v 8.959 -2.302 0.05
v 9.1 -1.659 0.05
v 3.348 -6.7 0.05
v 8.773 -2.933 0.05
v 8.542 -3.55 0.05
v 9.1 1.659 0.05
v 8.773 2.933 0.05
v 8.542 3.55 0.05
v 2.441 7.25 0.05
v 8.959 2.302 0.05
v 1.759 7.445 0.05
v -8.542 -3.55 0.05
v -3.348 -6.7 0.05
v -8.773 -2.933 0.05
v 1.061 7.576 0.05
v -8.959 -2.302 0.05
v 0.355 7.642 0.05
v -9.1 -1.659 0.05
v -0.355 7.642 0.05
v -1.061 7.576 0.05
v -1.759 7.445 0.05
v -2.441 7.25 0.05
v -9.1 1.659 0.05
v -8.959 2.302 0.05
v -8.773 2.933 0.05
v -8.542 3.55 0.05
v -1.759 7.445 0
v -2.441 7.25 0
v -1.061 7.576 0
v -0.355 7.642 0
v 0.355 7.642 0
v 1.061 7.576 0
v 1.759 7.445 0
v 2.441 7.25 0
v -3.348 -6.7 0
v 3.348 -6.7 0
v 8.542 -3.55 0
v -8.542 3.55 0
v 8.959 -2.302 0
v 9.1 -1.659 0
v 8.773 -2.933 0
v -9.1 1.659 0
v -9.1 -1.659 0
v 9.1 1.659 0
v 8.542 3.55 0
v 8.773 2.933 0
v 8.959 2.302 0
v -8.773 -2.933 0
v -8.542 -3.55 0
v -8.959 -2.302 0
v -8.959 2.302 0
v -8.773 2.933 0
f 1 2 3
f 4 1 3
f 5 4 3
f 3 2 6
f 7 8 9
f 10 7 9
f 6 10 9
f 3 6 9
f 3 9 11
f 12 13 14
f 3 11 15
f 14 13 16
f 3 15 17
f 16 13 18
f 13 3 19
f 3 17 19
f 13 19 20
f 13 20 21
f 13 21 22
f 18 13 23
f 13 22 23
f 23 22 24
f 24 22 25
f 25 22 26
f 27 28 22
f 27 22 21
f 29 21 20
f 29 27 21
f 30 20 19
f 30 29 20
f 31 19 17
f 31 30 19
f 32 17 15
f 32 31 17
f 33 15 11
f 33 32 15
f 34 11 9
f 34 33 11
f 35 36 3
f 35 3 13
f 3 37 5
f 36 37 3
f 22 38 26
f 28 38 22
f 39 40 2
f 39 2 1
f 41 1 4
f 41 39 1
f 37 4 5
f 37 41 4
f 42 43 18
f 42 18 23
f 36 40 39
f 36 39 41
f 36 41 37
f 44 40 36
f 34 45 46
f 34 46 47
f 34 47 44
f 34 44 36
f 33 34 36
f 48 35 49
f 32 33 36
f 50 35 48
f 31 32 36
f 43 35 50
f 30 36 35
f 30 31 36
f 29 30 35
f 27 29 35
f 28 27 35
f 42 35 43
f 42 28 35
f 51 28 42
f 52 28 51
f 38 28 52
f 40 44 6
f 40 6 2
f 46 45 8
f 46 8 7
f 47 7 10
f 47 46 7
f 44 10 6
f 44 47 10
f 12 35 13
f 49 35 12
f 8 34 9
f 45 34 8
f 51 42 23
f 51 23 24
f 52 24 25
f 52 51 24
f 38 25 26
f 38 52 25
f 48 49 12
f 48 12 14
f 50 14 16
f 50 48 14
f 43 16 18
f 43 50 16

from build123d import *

# Parameters (mm, degrees)
BOSS_EXTRU_1_DEPTH = 0.05


with BuildPart() as part:
    # Esquisse1 → Boss.-Extru.1 (new body)
    with BuildSketch(Plane.XY):
        with BuildLine():
            Line((9.1, 1.659066002), (9.1, -1.659066002))
            ThreePointArc((9.1, -1.659066002), (8.871356868, -2.619451721), (8.541662602, -3.55))
            Line((8.541662602, -3.55), (3.348120127, -6.7))
            Line((3.348120127, -6.7), (-3.348120127, -6.7))
            Line((-3.348120127, -6.7), (-8.541662602, -3.55))
            ThreePointArc((-8.541662602, -3.55), (-8.871356868, -2.619451721), (-9.1, -1.659066002))
            Line((-9.1, -1.659066002), (-9.1, 1.659066002))
            ThreePointArc((-9.1, 1.659066002), (-8.871356868, 2.619451721), (-8.541662602, 3.55))
            Line((-8.541662602, 3.55), (-2.441311123, 7.25))
            ThreePointArc((-2.441311123, 7.25), (0, 7.65), (2.441311123, 7.25))
            Line((2.441311123, 7.25), (8.541662602, 3.55))
            ThreePointArc((8.541662602, 3.55), (8.871356868, 2.619451721), (9.1, 1.659066002))
        make_face()
    extrude(amount=BOSS_EXTRU_1_DEPTH)


solid = part.part
